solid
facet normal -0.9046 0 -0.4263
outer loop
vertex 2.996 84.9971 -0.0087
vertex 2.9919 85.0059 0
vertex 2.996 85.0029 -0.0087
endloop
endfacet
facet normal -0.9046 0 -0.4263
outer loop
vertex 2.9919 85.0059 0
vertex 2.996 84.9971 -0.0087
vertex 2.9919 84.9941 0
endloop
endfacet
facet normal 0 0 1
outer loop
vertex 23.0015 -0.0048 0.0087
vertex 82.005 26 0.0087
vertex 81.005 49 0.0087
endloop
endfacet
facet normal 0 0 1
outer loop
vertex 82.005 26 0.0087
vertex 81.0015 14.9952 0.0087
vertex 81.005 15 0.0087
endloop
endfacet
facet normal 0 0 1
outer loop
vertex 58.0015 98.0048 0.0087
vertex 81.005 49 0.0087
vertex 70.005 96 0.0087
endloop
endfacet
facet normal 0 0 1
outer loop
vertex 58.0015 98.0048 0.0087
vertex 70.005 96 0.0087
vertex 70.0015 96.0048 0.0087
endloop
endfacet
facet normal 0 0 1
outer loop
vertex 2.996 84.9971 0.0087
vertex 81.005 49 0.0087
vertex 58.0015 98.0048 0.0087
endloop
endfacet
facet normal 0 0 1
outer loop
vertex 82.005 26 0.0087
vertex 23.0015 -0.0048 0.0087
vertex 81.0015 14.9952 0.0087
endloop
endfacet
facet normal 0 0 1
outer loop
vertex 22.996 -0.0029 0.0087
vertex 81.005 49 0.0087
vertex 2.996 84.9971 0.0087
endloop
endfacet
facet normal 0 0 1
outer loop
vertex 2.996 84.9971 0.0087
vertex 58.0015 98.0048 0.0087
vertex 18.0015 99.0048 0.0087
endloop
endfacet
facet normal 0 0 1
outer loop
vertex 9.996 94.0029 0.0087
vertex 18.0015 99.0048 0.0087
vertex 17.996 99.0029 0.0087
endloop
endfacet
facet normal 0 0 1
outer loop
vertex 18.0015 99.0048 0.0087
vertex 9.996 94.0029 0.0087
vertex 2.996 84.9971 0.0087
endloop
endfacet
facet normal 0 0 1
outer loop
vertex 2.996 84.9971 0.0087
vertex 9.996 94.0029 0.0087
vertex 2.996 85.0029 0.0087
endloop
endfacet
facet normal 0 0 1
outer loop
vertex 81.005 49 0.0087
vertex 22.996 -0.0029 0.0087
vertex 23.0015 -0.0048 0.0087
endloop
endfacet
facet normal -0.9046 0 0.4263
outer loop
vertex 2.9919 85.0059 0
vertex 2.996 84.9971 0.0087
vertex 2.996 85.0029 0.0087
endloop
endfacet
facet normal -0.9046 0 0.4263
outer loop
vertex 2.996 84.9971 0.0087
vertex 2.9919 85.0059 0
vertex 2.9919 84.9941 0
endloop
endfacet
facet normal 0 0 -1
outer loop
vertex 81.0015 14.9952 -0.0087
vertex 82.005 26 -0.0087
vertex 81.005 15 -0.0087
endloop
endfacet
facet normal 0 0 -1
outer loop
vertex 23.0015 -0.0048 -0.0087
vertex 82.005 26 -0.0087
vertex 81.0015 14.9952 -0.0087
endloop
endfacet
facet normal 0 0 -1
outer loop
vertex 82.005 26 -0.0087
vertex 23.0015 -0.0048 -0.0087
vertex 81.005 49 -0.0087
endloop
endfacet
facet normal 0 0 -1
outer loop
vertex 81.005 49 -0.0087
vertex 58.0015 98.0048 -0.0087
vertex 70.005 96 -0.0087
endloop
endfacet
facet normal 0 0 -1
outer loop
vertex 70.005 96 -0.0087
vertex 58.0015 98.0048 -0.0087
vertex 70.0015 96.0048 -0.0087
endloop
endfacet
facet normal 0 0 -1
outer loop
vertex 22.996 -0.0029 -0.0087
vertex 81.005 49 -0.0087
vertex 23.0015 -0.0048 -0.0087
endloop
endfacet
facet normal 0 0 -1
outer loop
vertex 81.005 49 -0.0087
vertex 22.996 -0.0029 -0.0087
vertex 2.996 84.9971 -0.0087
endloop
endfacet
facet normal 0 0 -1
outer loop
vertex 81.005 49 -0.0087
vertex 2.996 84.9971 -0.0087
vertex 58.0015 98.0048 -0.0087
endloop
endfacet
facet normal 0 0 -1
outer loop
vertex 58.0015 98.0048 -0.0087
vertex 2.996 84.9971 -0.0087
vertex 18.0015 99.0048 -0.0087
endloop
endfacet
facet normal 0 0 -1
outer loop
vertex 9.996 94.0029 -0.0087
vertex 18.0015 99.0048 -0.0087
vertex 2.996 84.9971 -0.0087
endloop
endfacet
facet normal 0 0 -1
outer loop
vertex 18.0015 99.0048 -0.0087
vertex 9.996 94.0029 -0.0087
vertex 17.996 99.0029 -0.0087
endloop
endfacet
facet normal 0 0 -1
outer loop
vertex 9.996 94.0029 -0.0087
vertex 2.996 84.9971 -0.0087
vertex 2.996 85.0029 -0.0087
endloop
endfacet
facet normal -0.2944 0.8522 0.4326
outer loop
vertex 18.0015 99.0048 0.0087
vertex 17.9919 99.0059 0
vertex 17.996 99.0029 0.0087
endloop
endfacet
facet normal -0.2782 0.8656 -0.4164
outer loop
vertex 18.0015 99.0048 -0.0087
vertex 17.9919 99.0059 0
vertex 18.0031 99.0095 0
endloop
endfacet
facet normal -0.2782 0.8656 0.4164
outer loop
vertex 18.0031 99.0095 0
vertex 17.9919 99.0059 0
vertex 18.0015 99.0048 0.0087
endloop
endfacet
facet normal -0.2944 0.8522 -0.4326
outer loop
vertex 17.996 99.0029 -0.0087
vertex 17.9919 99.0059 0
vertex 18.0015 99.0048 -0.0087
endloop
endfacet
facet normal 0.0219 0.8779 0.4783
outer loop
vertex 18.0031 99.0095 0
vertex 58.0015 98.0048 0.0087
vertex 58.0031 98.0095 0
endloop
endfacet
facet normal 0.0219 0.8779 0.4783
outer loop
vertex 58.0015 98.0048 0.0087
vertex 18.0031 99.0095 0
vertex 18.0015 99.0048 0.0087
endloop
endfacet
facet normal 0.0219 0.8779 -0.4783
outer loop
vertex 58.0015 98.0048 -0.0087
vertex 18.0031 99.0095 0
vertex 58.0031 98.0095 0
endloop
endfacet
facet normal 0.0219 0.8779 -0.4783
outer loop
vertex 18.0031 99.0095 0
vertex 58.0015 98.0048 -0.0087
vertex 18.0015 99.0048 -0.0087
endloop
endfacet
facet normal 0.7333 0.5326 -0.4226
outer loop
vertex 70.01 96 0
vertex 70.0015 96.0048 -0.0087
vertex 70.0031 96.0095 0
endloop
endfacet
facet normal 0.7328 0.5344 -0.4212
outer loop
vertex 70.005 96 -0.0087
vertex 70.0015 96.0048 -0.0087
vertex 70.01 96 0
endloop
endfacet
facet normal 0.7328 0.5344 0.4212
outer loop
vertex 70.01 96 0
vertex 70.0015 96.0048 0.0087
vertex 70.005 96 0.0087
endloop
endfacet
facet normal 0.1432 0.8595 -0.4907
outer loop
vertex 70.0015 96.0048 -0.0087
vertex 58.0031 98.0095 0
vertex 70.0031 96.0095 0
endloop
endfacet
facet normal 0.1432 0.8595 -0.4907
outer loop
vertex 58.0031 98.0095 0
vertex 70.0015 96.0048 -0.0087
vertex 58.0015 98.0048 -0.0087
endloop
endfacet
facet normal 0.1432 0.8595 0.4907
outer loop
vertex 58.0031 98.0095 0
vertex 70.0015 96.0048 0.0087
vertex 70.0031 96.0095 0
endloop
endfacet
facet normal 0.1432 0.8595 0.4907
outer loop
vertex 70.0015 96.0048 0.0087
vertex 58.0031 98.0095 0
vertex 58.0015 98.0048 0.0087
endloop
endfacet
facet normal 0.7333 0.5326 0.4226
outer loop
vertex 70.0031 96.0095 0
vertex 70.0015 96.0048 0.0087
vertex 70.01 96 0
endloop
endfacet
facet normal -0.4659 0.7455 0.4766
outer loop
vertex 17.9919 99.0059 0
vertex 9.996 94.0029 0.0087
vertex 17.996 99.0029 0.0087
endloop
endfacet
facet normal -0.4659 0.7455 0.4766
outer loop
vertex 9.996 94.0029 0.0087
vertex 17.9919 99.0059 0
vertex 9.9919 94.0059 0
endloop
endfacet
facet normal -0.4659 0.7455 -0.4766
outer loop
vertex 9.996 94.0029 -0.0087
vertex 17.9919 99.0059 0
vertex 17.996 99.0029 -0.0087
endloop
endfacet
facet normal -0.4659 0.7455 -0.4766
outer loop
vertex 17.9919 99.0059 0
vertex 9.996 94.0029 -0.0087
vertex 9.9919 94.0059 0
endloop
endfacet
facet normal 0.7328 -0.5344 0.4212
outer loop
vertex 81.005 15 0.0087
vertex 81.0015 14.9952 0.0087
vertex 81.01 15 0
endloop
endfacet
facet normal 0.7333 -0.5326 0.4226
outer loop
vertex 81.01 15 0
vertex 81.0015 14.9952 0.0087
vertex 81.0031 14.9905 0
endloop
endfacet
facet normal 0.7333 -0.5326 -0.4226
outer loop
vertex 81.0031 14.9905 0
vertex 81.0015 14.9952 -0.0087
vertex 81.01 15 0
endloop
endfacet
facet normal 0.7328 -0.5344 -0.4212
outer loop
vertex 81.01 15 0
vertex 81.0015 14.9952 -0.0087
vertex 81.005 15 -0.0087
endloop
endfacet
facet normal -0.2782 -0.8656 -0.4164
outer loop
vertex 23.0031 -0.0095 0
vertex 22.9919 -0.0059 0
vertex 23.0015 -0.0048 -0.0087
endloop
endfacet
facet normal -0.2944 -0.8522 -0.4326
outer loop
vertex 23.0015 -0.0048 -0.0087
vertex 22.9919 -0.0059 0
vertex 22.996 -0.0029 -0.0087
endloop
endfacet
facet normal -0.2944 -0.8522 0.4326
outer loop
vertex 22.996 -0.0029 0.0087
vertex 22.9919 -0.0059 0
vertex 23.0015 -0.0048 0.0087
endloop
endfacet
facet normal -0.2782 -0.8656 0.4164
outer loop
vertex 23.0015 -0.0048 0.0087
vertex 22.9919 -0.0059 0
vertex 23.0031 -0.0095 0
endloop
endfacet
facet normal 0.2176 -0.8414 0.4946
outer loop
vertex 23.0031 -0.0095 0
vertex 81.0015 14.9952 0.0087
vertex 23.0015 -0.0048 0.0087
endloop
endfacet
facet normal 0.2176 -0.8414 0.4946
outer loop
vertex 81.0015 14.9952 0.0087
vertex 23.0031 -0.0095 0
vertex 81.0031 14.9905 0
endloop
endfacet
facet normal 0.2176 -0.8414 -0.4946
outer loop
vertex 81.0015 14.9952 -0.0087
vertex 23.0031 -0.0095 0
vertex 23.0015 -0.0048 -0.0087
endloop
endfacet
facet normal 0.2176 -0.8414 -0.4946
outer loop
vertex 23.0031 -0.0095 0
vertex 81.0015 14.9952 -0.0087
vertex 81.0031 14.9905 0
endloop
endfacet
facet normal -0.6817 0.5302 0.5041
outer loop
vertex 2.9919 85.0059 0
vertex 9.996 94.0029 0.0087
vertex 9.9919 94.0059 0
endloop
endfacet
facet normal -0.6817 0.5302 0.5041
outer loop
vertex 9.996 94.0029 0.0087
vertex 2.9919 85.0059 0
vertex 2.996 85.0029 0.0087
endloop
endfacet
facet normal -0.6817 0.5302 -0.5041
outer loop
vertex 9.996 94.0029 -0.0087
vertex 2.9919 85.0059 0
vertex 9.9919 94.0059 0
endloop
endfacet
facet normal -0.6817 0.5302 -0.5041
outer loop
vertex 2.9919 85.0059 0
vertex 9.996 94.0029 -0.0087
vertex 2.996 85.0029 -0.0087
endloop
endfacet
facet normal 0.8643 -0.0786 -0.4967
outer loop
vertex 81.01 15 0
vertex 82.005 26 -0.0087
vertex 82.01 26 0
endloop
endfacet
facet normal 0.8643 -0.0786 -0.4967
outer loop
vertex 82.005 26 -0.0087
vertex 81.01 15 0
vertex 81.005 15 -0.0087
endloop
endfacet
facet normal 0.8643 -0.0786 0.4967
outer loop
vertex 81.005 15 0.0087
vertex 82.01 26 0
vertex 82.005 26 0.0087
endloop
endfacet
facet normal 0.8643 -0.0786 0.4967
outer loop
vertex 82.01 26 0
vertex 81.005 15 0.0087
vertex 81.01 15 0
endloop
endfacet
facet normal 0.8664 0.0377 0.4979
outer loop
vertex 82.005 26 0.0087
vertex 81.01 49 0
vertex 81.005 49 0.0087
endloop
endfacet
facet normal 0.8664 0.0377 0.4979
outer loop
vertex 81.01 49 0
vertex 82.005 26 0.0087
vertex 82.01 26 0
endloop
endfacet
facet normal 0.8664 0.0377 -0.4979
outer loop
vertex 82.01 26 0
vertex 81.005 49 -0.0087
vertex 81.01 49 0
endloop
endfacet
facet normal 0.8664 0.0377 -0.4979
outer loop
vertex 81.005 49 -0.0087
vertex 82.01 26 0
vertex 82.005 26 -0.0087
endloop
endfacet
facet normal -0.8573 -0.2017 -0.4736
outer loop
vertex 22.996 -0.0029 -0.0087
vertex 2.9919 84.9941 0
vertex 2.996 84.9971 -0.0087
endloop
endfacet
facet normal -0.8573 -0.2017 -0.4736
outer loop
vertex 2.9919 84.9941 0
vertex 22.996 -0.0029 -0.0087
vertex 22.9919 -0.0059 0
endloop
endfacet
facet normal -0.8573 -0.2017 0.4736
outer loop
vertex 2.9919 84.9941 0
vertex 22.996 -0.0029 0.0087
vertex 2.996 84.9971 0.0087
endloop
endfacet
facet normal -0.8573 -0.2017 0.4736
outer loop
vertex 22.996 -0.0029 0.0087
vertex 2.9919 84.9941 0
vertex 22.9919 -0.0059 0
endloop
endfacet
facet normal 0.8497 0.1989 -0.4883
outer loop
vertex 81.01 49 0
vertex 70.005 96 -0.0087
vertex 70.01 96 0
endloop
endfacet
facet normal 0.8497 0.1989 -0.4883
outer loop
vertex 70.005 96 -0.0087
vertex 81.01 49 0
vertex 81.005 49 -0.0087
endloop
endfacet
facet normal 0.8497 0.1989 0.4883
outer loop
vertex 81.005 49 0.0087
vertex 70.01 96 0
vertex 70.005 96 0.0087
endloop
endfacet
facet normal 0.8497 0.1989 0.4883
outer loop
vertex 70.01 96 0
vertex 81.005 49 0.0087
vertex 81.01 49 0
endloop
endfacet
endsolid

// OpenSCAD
color([0.8432397019629626,0.2883830928152321,0.23139986036280558]) hull(){
    translate([18,58]) sphere(0.01);
    translate([6,84]) sphere(0.01);
    translate([3,85]) sphere(0.01);
}
color([0.0180364627349191,0.35314011923198985,0.9589424474672257]) hull(){
    translate([18,58]) sphere(0.01);
    translate([6,84]) sphere(0.01);
    translate([16,79]) sphere(0.01);
}
color([0.2619290021782883,0.20369548429490625,0.5420815487250377]) hull(){
    translate([18,58]) sphere(0.01);
    translate([18,24]) sphere(0.01);
    translate([26,51]) sphere(0.01);
}
color([0.9221305525684157,0.837748898711002,0.8622867035840079]) hull(){
    translate([18,58]) sphere(0.01);
    translate([18,24]) sphere(0.01);
    translate([3,85]) sphere(0.01);
}
color([0.727429224436118,0.821332708873966,0.2567577523046298]) hull(){
    translate([18,58]) sphere(0.01);
    translate([26,51]) sphere(0.01);
    translate([30,57]) sphere(0.01);
}
color([0.1353372895865157,0.7613019869252476,0.15437996216449157]) hull(){
    translate([18,58]) sphere(0.01);
    translate([30,57]) sphere(0.01);
    translate([16,79]) sphere(0.01);
}
color([0.5724302025923821,0.22728732004270547,0.8377719495956792]) hull(){
    translate([58,98]) sphere(0.01);
    translate([50,93]) sphere(0.01);
    translate([39,98]) sphere(0.01);
}
color([0.3661955888727618,0.7135191579002272,0.515047468161266]) hull(){
    translate([58,98]) sphere(0.01);
    translate([50,93]) sphere(0.01);
    translate([59,71]) sphere(0.01);
}
color([0.13764795316468892,0.40448573996937276,0.8917260836787828]) hull(){
    translate([58,98]) sphere(0.01);
    translate([39,98]) sphere(0.01);
    translate([18,99]) sphere(0.01);
}
color([0.7643233656004556,0.5236824296690593,0.15029798138806982]) hull(){
    translate([58,98]) sphere(0.01);
    translate([59,71]) sphere(0.01);
    translate([70,96]) sphere(0.01);
}
color([0.9580407420374472,0.6000911555631969,0.025324835711835636]) hull(){
    translate([22,90]) sphere(0.01);
    translate([10,94]) sphere(0.01);
    translate([20,83]) sphere(0.01);
}
color([0.8628581448400192,0.48332959823715915,0.760144685355809]) hull(){
    translate([22,90]) sphere(0.01);
    translate([10,94]) sphere(0.01);
    translate([18,99]) sphere(0.01);
}
color([0.17349489212301172,0.7172022627612936,0.8738126079333703]) hull(){
    translate([22,90]) sphere(0.01);
    translate([39,98]) sphere(0.01);
    translate([20,83]) sphere(0.01);
}
color([0.7407081150283871,0.1750257628023656,0.7717601752613227]) hull(){
    translate([22,90]) sphere(0.01);
    translate([39,98]) sphere(0.01);
    translate([18,99]) sphere(0.01);
}
color([0.17462951192396858,0.1365817917740666,0.790898096633715]) hull(){
    translate([50,93]) sphere(0.01);
    translate([39,98]) sphere(0.01);
    translate([20,83]) sphere(0.01);
}
color([0.05068813004758421,0.2747417086491215,0.9775332998919624]) hull(){
    translate([50,93]) sphere(0.01);
    translate([59,71]) sphere(0.01);
    translate([20,83]) sphere(0.01);
}
color([0.3741990821064618,0.5760507248775137,0.9764706525564496]) hull(){
    translate([44,55]) sphere(0.01);
    translate([44,47]) sphere(0.01);
    translate([35,48]) sphere(0.01);
}
color([0.6412339051880062,0.9116486495874845,0.653753263894704]) hull(){
    translate([44,55]) sphere(0.01);
    translate([44,47]) sphere(0.01);
    translate([77,50]) sphere(0.01);
}
color([0.7391387592304974,0.7973855488942889,0.8338139774032114]) hull(){
    translate([44,55]) sphere(0.01);
    translate([59,71]) sphere(0.01);
    translate([77,50]) sphere(0.01);
}
color([0.5893068505654989,0.9387852932083598,0.6768105799142914]) hull(){
    translate([44,55]) sphere(0.01);
    translate([59,71]) sphere(0.01);
    translate([30,57]) sphere(0.01);
}
color([0.26314077483765086,0.6459233453457565,0.8790980253849315]) hull(){
    translate([44,55]) sphere(0.01);
    translate([35,48]) sphere(0.01);
    translate([30,57]) sphere(0.01);
}
color([0.15362837418895858,0.31061588741770185,0.8944360920803668]) hull(){
    translate([64,14]) sphere(0.01);
    translate([68,15]) sphere(0.01);
    translate([81,15]) sphere(0.01);
}
color([0.2723573567519545,0.029723278769515638,0.14137415559711708]) hull(){
    translate([64,14]) sphere(0.01);
    translate([68,15]) sphere(0.01);
    translate([72,20]) sphere(0.01);
}
color([0.24588268133825053,0.688989335517289,0.012833732972479917]) hull(){
    translate([64,14]) sphere(0.01);
    translate([58,33]) sphere(0.01);
    translate([42,29]) sphere(0.01);
}
color([0.4317421186444177,0.09476467904542085,0.2539030370426648]) hull(){
    translate([64,14]) sphere(0.01);
    translate([58,33]) sphere(0.01);
    translate([72,20]) sphere(0.01);
}
color([0.4433940275438375,0.6374619106411259,0.7629796076056016]) hull(){
    translate([64,14]) sphere(0.01);
    translate([42,29]) sphere(0.01);
    translate([23,0]) sphere(0.01);
}
color([0.33974962563874156,0.40746011996126574,0.8304662499681598]) hull(){
    translate([64,14]) sphere(0.01);
    translate([81,15]) sphere(0.01);
    translate([23,0]) sphere(0.01);
}
color([0.03737370743548629,0.7771030741686201,0.7450583503430228]) hull(){
    translate([68,15]) sphere(0.01);
    translate([81,15]) sphere(0.01);
    translate([72,20]) sphere(0.01);
}
color([0.7664898273962963,0.9635930682622835,0.37370940745190284]) hull(){
    translate([10,94]) sphere(0.01);
    translate([6,84]) sphere(0.01);
    translate([20,83]) sphere(0.01);
}
color([0.5269890278256799,0.7391003970289415,0.05440955639390033]) hull(){
    translate([10,94]) sphere(0.01);
    translate([6,84]) sphere(0.01);
    translate([3,85]) sphere(0.01);
}
color([0.16266859334294614,0.5860851836586503,0.6198514899274227]) hull(){
    translate([58,33]) sphere(0.01);
    translate([82,26]) sphere(0.01);
    translate([77,50]) sphere(0.01);
}
color([0.617768007375954,0.696939114622172,0.24987298892689824]) hull(){
    translate([58,33]) sphere(0.01);
    translate([82,26]) sphere(0.01);
    translate([72,20]) sphere(0.01);
}
color([0.10727882524928667,0.2542017095222042,0.647326061070541]) hull(){
    translate([58,33]) sphere(0.01);
    translate([42,29]) sphere(0.01);
    translate([44,47]) sphere(0.01);
}
color([0.6145129037504997,0.7319188036610002,0.2916410122362264]) hull(){
    translate([58,33]) sphere(0.01);
    translate([44,47]) sphere(0.01);
    translate([77,50]) sphere(0.01);
}
color([0.46410792523938205,0.009432899408237327,0.2601511175245954]) hull(){
    translate([6,84]) sphere(0.01);
    translate([20,83]) sphere(0.01);
    translate([16,79]) sphere(0.01);
}
color([0.9661595458779266,0.8212204941997756,0.9717572370221306]) hull(){
    translate([82,26]) sphere(0.01);
    translate([81,15]) sphere(0.01);
    translate([72,20]) sphere(0.01);
}
color([0.7094339661906762,0.3687560915635114,0.91551222113324]) hull(){
    translate([82,26]) sphere(0.01);
    translate([77,50]) sphere(0.01);
    translate([81,49]) sphere(0.01);
}
color([0.32058638357595914,0.6286861798780845,0.3438006598659582]) hull(){
    translate([42,29]) sphere(0.01);
    translate([26,22]) sphere(0.01);
    translate([35,48]) sphere(0.01);
}
color([0.6764002586894835,0.49002609359593985,0.6828992283474875]) hull(){
    translate([42,29]) sphere(0.01);
    translate([26,22]) sphere(0.01);
    translate([23,0]) sphere(0.01);
}
color([0.9457740861038292,0.48113916365283227,0.11743485119222763]) hull(){
    translate([42,29]) sphere(0.01);
    translate([44,47]) sphere(0.01);
    translate([35,48]) sphere(0.01);
}
color([0.6785611781392669,0.3559530637070777,0.24479389591231593]) hull(){
    translate([26,22]) sphere(0.01);
    translate([18,24]) sphere(0.01);
    translate([26,51]) sphere(0.01);
}
color([0.19718264729666257,0.5265513877214916,0.7820972605832109]) hull(){
    translate([26,22]) sphere(0.01);
    translate([18,24]) sphere(0.01);
    translate([24,21]) sphere(0.01);
}
color([0.016540899859545988,0.2649906914184337,0.6195666266963675]) hull(){
    translate([26,22]) sphere(0.01);
    translate([26,51]) sphere(0.01);
    translate([35,48]) sphere(0.01);
}
color([0.9400622663204184,0.8580807518186289,0.33004078082379396]) hull(){
    translate([26,22]) sphere(0.01);
    translate([23,0]) sphere(0.01);
    translate([24,21]) sphere(0.01);
}
color([0.9838273149753736,0.1297919343219498,0.6092048694604357]) hull(){
    translate([18,24]) sphere(0.01);
    translate([23,0]) sphere(0.01);
    translate([24,21]) sphere(0.01);
}
color([0.4362496777237921,0.204876863896859,0.7703581377154641]) hull(){
    translate([18,24]) sphere(0.01);
    translate([23,0]) sphere(0.01);
    translate([3,85]) sphere(0.01);
}
color([0.24016059236570497,0.9925708955515705,0.45030012798788]) hull(){
    translate([80,52]) sphere(0.01);
    translate([59,71]) sphere(0.01);
    translate([77,50]) sphere(0.01);
}
color([0.6687095525163839,0.6084946124880205,0.9354113971140408]) hull(){
    translate([80,52]) sphere(0.01);
    translate([59,71]) sphere(0.01);
    translate([70,96]) sphere(0.01);
}
color([0.40170597484563164,0.9257642462472301,0.7352475143256585]) hull(){
    translate([80,52]) sphere(0.01);
    translate([77,50]) sphere(0.01);
    translate([81,49]) sphere(0.01);
}
color([0.9040805991886998,0.8303556425691195,0.04360117165228117]) hull(){
    translate([80,52]) sphere(0.01);
    translate([81,49]) sphere(0.01);
    translate([70,96]) sphere(0.01);
}
color([0.19461635406133904,0.24937487606759356,0.948798389089598]) hull(){
    translate([26,51]) sphere(0.01);
    translate([35,48]) sphere(0.01);
    translate([30,57]) sphere(0.01);
}
color([0.463582495028668,0.8326751819056648,0.9518902994268229]) hull(){
    translate([59,71]) sphere(0.01);
    translate([20,83]) sphere(0.01);
    translate([30,57]) sphere(0.01);
}
color([0.6590575290507751,0.08125165305796267,0.4650668984349794]) hull(){
    translate([20,83]) sphere(0.01);
    translate([30,57]) sphere(0.01);
    translate([16,79]) sphere(0.01);
}
